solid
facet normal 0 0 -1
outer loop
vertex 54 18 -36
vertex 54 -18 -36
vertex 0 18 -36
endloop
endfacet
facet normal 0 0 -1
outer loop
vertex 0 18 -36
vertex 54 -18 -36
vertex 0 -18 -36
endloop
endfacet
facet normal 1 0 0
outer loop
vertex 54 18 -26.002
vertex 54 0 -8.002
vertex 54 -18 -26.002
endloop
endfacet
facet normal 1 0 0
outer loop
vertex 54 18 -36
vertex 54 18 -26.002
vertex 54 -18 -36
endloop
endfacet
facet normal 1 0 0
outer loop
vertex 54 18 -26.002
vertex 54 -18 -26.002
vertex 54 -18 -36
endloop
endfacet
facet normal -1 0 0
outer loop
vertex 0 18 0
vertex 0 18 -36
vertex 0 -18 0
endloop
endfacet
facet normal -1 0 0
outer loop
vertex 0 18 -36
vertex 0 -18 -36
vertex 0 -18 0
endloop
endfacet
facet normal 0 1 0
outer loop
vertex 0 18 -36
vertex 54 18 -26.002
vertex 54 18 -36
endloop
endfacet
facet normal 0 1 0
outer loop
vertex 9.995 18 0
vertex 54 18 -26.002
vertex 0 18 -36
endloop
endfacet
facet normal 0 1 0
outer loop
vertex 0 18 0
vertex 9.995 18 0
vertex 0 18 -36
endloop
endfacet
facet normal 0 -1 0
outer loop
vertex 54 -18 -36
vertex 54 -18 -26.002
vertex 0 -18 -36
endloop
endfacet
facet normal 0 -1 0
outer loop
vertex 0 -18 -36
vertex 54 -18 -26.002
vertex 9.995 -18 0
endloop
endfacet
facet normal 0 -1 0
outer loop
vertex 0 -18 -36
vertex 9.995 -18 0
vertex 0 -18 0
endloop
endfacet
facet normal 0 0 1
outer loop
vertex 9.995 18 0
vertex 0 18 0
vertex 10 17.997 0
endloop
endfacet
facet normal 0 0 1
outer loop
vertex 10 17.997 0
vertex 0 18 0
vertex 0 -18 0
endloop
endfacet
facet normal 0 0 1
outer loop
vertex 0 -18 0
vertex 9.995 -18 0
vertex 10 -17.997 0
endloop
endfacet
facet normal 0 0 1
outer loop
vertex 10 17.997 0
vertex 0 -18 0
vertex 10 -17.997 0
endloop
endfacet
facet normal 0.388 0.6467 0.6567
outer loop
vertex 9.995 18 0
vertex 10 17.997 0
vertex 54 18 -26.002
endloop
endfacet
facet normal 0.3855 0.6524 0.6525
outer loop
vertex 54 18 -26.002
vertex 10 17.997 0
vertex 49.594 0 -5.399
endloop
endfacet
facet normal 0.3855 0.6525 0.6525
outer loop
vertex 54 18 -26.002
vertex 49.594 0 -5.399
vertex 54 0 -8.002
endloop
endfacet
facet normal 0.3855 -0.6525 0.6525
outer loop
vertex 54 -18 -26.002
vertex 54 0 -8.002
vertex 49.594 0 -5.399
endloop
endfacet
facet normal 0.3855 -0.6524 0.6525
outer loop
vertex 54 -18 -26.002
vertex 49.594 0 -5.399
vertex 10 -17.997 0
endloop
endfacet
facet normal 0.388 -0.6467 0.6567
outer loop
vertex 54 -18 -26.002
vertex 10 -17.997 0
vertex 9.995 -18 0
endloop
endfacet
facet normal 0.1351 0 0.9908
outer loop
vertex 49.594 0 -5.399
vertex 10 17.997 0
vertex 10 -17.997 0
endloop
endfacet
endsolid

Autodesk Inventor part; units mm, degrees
ref_plane "YZ Plane" through (0, 0, 0) normal (1, 0, 0) x (0, 1, 0)
ref_plane "XZ Plane" through (0, 0, 0) normal (0, 1, 0) x (-1, 0, 0)
sketch "草圖1" plane through (0, 0, 0) normal (0, 1, 0) x (-1, 0, 0)
  line L0 (0, 0) -> (-54, 0)
  line L1 (-54, 0) -> (-54, -36)
  line L2 (-54, -36) -> (0, -36)
  line L3 (0, -36) -> (0, 0)
  dimension "d0" = 54
  dimension "d1" = 36
extrude "擠出1" add sketch "草圖1" along normal mid plane 36
sketch "草圖2" plane through (0, 18, 0) normal (0, 1, 0) x (1, 0, 0)
  line L0 (0, 0) -> (54, 0) projected
  line L1 (10, 0) -> (54, 6)
  line L2 (54, 0) -> (54, 36) projected
  dimension "d4" = 10
  dimension "d5" = 30
extrude "擠出2" cut sketch "草圖2" against normal blind 40
sketch "草圖3" plane through (54, -18, -36) normal (1, 0, 0) x (0, 0, -1)
  line L0 (-30, 16) -> (-10, 36)
  line L1 (0, 36) -> (-36, 36) projected
  line L2 (-30, 36) -> (-30, 0) projected
  point P0 (-36, 18)
  dimension "d8" = 20
  dimension "d9" = 20
ref_plane "工作平面1" through (10, 18, 0) normal (-0.3855, -0.6524, -0.6524) x (0.8609, 0, -0.5087)
sketch "草圖4" plane through (10, 18, 0) normal (-0.3855, -0.6524, -0.6524) x (0.8609, 0, -0.5087)
  line L0 (-15.1543, -12.3218) -> (93.717, -12.3218)
  line L1 (93.717, -12.3218) -> (93.717, 28.8166)
  line L2 (93.717, 28.8166) -> (-15.1543, 28.8166)
  line L3 (-15.1543, 28.8166) -> (-15.1543, -12.3218)
  point P0 (-8.6093, 10.3219)
extrude "擠出3" cut sketch "草圖4" against normal blind 40
mirror "鏡射1" about plane through (0, 0, 0) normal (0, 1, 0) of "擠出3"
properties part number "1"
